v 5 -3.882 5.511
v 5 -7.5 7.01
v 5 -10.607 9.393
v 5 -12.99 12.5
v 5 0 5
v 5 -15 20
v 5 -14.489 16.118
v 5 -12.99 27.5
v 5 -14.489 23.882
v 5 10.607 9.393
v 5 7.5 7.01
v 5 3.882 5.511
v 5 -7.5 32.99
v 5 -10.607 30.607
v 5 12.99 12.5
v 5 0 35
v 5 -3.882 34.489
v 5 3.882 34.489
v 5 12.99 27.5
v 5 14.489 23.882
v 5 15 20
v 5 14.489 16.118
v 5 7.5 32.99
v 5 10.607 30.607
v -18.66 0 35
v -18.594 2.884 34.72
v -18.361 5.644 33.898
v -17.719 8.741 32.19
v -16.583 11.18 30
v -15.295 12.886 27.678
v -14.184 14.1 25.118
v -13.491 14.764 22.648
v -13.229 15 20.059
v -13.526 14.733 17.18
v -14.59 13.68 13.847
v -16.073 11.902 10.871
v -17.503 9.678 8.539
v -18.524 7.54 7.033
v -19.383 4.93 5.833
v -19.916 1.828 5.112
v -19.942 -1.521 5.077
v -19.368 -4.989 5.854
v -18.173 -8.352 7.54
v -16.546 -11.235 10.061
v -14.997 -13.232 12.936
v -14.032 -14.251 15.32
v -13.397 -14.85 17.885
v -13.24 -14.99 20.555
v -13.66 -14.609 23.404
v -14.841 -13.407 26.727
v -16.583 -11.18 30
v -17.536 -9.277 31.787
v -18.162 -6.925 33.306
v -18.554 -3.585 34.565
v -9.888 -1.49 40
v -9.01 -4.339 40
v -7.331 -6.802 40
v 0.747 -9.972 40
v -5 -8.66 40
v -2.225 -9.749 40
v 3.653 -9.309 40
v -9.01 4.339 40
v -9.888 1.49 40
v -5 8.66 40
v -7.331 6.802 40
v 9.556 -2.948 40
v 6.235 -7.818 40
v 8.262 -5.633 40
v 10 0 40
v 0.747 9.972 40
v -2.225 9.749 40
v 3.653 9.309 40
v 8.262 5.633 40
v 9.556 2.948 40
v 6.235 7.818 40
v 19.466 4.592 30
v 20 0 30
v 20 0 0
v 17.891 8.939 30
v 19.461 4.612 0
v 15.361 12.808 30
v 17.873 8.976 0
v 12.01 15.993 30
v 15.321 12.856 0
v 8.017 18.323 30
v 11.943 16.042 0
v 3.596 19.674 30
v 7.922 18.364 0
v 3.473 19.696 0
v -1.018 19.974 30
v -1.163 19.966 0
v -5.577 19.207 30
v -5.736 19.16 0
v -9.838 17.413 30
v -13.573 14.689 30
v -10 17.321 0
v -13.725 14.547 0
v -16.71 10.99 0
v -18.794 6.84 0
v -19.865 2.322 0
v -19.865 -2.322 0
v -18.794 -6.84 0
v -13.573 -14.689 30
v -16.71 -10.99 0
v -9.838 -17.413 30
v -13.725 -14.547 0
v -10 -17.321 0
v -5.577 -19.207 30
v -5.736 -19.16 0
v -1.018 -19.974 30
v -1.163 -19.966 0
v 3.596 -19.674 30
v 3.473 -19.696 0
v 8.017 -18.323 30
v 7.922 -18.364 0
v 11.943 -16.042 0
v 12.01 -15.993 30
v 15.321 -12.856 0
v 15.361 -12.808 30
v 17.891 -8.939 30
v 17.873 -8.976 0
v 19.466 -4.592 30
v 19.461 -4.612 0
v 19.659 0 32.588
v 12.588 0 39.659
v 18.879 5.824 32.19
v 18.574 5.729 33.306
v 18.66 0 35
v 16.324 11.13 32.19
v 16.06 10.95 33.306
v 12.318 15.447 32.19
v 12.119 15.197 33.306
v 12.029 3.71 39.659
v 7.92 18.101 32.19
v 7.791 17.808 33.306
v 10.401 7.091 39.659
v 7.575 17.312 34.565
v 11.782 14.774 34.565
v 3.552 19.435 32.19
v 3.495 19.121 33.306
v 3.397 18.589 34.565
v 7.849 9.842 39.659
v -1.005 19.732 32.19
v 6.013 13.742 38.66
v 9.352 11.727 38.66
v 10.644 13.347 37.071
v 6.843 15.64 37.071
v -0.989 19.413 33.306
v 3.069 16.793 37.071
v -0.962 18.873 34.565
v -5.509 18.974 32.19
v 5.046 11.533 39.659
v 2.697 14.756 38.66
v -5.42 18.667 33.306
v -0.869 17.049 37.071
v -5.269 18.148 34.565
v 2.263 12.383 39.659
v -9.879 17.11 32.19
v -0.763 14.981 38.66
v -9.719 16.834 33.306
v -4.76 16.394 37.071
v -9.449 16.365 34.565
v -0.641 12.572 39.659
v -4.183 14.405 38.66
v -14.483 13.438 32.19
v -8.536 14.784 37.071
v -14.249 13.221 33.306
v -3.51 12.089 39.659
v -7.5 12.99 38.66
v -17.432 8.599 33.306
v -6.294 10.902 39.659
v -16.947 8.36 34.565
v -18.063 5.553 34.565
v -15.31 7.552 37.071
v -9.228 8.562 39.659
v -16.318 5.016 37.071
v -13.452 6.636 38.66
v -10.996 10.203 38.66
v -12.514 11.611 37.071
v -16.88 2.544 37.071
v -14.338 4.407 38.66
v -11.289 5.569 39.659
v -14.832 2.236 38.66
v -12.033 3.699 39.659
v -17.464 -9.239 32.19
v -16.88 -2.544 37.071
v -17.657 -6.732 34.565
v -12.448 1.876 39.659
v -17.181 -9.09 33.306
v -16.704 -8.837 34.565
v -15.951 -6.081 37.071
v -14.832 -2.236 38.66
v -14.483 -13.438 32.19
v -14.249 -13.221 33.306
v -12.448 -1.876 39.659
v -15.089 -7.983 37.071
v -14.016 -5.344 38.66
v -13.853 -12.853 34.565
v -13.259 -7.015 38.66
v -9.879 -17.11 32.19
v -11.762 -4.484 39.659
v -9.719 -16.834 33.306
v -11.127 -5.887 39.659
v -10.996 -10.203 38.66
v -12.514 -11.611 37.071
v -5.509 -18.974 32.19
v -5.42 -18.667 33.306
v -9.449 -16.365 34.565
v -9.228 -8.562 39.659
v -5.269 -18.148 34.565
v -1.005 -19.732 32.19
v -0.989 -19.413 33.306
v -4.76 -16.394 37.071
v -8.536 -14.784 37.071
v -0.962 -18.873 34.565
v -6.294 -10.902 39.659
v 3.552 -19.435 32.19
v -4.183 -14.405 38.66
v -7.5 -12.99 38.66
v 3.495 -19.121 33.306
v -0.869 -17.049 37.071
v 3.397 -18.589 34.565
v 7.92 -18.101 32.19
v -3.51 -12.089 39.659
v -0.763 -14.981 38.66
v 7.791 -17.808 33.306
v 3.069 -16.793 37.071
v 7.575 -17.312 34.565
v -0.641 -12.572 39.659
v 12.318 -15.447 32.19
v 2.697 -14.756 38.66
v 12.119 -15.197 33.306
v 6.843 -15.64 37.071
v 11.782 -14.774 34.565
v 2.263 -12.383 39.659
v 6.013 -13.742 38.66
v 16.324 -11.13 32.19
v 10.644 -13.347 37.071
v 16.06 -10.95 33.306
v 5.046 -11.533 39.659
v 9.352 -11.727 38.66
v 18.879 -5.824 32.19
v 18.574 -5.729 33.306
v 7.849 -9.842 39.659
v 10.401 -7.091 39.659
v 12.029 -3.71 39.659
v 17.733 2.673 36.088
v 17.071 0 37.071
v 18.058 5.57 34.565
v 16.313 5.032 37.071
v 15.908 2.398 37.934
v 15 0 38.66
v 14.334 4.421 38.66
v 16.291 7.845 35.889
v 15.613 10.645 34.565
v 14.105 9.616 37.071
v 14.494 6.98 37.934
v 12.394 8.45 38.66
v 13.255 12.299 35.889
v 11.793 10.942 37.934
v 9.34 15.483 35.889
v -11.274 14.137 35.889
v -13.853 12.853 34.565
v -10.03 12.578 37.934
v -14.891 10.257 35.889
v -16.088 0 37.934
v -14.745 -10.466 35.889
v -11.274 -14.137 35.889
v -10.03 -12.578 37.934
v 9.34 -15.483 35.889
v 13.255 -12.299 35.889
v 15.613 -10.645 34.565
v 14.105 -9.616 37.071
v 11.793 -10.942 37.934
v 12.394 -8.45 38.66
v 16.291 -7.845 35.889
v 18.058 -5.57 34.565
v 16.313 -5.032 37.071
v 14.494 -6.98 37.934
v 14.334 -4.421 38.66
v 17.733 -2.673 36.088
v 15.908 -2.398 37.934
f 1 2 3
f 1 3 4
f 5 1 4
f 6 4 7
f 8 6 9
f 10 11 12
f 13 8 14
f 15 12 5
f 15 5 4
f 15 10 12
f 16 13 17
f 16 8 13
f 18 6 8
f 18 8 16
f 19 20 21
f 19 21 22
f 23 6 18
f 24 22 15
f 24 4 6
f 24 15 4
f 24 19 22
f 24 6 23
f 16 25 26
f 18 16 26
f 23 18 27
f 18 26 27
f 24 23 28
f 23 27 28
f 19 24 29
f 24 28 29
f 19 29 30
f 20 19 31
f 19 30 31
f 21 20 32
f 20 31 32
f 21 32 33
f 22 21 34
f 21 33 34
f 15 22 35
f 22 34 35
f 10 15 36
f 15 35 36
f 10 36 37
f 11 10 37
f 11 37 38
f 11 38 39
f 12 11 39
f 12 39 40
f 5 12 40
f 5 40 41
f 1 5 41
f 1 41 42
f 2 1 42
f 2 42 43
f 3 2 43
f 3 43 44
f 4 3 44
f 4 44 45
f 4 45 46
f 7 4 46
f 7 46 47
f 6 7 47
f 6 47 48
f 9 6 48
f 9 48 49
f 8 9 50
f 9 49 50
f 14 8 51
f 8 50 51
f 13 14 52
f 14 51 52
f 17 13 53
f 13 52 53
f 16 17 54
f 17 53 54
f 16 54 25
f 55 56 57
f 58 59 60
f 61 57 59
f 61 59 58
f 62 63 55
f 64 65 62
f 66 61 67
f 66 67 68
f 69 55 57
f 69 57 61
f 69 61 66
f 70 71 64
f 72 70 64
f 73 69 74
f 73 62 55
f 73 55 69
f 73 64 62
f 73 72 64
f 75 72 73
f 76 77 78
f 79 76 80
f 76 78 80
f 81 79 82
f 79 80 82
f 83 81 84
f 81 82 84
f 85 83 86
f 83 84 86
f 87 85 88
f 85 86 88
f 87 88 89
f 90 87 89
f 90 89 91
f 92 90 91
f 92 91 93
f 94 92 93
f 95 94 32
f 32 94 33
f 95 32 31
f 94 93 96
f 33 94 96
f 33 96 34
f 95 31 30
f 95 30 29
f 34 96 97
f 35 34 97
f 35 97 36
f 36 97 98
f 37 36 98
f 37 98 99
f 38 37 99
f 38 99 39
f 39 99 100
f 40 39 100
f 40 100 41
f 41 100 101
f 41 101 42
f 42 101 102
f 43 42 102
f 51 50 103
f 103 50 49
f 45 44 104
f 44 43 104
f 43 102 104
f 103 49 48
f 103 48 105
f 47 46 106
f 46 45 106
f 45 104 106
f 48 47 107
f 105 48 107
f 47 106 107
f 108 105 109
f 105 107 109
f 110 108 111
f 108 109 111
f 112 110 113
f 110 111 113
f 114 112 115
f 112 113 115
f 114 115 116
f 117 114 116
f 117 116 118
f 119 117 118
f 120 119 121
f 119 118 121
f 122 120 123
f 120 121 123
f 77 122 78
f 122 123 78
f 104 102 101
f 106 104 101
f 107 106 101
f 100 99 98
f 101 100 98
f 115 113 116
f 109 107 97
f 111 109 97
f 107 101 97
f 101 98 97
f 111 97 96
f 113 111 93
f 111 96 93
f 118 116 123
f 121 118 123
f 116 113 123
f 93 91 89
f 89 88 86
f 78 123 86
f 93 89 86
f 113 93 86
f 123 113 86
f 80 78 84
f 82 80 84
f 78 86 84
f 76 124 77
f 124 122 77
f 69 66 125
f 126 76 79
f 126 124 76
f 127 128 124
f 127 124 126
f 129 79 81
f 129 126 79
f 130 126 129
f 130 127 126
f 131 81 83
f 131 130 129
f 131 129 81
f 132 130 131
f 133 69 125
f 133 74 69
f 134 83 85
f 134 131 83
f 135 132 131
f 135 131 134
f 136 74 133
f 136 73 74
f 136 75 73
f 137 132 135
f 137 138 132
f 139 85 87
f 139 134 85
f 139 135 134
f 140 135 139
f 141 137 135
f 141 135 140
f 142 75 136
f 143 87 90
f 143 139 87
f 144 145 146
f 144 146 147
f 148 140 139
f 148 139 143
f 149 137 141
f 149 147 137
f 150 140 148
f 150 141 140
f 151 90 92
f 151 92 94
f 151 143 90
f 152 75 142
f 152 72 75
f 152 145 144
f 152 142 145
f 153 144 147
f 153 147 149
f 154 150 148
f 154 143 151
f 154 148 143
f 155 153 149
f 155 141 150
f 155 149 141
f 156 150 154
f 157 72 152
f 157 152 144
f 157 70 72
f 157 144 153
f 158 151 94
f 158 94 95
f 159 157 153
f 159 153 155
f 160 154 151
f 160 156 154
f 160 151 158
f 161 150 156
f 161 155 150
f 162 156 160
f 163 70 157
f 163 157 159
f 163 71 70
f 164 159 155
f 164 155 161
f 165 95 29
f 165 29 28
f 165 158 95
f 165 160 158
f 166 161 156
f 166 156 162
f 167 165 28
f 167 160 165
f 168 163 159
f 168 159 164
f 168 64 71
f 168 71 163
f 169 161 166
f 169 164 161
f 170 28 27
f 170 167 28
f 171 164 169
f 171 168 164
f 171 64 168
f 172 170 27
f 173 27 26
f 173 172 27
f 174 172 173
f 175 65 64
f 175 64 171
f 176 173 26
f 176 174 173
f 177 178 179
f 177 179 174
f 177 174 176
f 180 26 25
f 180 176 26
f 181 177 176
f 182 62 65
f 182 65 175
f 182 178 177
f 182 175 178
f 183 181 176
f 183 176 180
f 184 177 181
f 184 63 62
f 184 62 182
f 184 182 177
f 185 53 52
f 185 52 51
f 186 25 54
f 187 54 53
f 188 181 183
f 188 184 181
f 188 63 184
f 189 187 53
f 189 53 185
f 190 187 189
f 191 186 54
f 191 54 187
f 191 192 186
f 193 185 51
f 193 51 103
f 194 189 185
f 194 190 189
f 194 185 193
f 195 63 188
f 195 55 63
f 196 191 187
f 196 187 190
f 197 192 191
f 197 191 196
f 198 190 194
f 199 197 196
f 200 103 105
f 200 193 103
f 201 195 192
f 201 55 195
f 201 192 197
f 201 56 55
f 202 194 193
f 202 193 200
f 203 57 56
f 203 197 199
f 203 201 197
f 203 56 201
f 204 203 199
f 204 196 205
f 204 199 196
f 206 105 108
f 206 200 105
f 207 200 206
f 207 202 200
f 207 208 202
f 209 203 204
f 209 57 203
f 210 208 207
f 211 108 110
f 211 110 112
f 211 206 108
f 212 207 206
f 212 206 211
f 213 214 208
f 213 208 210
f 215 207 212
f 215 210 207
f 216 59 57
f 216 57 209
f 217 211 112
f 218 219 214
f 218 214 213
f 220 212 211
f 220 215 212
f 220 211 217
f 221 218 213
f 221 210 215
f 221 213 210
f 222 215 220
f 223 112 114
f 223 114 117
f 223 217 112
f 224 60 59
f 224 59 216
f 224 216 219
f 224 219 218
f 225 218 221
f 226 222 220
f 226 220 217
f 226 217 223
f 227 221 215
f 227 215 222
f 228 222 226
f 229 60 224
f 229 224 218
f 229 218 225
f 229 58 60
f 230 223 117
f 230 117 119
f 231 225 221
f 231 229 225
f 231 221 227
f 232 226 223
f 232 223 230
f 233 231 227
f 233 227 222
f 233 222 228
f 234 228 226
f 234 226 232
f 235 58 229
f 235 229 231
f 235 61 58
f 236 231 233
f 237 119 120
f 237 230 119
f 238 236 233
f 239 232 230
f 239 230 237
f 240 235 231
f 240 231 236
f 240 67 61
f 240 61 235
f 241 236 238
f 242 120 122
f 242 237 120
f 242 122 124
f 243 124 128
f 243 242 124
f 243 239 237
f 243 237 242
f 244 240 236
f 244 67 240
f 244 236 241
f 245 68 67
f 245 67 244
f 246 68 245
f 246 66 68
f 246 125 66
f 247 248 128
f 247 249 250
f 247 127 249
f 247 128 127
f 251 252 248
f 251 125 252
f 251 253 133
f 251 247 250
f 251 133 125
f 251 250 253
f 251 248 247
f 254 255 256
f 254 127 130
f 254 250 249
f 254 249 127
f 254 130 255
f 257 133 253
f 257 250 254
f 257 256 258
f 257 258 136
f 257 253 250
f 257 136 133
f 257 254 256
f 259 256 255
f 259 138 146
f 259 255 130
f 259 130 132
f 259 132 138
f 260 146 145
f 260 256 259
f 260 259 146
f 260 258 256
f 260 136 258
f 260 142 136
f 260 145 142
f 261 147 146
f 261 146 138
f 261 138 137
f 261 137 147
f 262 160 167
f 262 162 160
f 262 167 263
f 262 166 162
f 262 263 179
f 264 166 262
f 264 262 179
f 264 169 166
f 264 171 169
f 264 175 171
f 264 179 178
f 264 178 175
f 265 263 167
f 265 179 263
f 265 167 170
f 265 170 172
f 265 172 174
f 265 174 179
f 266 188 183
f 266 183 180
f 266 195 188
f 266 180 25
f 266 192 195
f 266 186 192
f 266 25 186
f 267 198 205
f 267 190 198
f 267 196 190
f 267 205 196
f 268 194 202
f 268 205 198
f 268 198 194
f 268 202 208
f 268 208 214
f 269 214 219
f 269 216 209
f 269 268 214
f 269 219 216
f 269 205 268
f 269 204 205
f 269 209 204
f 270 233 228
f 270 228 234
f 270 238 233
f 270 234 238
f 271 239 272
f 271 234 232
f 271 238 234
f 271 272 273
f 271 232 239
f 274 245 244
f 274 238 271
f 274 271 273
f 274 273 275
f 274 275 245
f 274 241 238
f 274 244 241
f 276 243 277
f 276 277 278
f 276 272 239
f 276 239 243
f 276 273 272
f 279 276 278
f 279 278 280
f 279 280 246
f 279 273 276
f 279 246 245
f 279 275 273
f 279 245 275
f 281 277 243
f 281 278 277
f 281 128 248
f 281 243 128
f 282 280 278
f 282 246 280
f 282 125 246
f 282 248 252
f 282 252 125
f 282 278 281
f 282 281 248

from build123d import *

# Parameters (mm, degrees)
SKETCH1_R           = 20
BOSS_EXTRUDE1_DEPTH = 40
SKETCH2_R           = 15
CUT_EXTRUDE1_DEPTH  = 25
FILLET1_R           = 10


with BuildPart() as part:
    # Sketch1 → Boss-Extrude1 (new body)
    with BuildSketch(Plane.XY):
        Circle(SKETCH1_R)
    extrude(amount=BOSS_EXTRUDE1_DEPTH)

    # Sketch2 → Cut-Extrude1 (cut)
    with BuildSketch(Plane.ZY.offset(20)):
        with Locations((20, 0)):
            Circle(SKETCH2_R)
    extrude(amount=-CUT_EXTRUDE1_DEPTH, mode=Mode.SUBTRACT)

    # Fillet1
    # the kernel refuses this fillet: 10 mm, written as the material it takes off along each edge
    with BuildSketch(Plane(origin=(0, 0, 40), x_dir=(1, 0, 0), z_dir=(0, -1, 0))) as fillet1_piece_1:
        with BuildLine():
            CenterArc((20 - FILLET1_R, -FILLET1_R), FILLET1_R, 0, 90)
            Line((20 - FILLET1_R, 0), (20, 0))
            Line((20, 0), (20, -FILLET1_R))
        make_face()
    revolve(axis=Axis((0, 0, 40), (0, 0, 1)), mode=Mode.SUBTRACT)


solid = part.part
